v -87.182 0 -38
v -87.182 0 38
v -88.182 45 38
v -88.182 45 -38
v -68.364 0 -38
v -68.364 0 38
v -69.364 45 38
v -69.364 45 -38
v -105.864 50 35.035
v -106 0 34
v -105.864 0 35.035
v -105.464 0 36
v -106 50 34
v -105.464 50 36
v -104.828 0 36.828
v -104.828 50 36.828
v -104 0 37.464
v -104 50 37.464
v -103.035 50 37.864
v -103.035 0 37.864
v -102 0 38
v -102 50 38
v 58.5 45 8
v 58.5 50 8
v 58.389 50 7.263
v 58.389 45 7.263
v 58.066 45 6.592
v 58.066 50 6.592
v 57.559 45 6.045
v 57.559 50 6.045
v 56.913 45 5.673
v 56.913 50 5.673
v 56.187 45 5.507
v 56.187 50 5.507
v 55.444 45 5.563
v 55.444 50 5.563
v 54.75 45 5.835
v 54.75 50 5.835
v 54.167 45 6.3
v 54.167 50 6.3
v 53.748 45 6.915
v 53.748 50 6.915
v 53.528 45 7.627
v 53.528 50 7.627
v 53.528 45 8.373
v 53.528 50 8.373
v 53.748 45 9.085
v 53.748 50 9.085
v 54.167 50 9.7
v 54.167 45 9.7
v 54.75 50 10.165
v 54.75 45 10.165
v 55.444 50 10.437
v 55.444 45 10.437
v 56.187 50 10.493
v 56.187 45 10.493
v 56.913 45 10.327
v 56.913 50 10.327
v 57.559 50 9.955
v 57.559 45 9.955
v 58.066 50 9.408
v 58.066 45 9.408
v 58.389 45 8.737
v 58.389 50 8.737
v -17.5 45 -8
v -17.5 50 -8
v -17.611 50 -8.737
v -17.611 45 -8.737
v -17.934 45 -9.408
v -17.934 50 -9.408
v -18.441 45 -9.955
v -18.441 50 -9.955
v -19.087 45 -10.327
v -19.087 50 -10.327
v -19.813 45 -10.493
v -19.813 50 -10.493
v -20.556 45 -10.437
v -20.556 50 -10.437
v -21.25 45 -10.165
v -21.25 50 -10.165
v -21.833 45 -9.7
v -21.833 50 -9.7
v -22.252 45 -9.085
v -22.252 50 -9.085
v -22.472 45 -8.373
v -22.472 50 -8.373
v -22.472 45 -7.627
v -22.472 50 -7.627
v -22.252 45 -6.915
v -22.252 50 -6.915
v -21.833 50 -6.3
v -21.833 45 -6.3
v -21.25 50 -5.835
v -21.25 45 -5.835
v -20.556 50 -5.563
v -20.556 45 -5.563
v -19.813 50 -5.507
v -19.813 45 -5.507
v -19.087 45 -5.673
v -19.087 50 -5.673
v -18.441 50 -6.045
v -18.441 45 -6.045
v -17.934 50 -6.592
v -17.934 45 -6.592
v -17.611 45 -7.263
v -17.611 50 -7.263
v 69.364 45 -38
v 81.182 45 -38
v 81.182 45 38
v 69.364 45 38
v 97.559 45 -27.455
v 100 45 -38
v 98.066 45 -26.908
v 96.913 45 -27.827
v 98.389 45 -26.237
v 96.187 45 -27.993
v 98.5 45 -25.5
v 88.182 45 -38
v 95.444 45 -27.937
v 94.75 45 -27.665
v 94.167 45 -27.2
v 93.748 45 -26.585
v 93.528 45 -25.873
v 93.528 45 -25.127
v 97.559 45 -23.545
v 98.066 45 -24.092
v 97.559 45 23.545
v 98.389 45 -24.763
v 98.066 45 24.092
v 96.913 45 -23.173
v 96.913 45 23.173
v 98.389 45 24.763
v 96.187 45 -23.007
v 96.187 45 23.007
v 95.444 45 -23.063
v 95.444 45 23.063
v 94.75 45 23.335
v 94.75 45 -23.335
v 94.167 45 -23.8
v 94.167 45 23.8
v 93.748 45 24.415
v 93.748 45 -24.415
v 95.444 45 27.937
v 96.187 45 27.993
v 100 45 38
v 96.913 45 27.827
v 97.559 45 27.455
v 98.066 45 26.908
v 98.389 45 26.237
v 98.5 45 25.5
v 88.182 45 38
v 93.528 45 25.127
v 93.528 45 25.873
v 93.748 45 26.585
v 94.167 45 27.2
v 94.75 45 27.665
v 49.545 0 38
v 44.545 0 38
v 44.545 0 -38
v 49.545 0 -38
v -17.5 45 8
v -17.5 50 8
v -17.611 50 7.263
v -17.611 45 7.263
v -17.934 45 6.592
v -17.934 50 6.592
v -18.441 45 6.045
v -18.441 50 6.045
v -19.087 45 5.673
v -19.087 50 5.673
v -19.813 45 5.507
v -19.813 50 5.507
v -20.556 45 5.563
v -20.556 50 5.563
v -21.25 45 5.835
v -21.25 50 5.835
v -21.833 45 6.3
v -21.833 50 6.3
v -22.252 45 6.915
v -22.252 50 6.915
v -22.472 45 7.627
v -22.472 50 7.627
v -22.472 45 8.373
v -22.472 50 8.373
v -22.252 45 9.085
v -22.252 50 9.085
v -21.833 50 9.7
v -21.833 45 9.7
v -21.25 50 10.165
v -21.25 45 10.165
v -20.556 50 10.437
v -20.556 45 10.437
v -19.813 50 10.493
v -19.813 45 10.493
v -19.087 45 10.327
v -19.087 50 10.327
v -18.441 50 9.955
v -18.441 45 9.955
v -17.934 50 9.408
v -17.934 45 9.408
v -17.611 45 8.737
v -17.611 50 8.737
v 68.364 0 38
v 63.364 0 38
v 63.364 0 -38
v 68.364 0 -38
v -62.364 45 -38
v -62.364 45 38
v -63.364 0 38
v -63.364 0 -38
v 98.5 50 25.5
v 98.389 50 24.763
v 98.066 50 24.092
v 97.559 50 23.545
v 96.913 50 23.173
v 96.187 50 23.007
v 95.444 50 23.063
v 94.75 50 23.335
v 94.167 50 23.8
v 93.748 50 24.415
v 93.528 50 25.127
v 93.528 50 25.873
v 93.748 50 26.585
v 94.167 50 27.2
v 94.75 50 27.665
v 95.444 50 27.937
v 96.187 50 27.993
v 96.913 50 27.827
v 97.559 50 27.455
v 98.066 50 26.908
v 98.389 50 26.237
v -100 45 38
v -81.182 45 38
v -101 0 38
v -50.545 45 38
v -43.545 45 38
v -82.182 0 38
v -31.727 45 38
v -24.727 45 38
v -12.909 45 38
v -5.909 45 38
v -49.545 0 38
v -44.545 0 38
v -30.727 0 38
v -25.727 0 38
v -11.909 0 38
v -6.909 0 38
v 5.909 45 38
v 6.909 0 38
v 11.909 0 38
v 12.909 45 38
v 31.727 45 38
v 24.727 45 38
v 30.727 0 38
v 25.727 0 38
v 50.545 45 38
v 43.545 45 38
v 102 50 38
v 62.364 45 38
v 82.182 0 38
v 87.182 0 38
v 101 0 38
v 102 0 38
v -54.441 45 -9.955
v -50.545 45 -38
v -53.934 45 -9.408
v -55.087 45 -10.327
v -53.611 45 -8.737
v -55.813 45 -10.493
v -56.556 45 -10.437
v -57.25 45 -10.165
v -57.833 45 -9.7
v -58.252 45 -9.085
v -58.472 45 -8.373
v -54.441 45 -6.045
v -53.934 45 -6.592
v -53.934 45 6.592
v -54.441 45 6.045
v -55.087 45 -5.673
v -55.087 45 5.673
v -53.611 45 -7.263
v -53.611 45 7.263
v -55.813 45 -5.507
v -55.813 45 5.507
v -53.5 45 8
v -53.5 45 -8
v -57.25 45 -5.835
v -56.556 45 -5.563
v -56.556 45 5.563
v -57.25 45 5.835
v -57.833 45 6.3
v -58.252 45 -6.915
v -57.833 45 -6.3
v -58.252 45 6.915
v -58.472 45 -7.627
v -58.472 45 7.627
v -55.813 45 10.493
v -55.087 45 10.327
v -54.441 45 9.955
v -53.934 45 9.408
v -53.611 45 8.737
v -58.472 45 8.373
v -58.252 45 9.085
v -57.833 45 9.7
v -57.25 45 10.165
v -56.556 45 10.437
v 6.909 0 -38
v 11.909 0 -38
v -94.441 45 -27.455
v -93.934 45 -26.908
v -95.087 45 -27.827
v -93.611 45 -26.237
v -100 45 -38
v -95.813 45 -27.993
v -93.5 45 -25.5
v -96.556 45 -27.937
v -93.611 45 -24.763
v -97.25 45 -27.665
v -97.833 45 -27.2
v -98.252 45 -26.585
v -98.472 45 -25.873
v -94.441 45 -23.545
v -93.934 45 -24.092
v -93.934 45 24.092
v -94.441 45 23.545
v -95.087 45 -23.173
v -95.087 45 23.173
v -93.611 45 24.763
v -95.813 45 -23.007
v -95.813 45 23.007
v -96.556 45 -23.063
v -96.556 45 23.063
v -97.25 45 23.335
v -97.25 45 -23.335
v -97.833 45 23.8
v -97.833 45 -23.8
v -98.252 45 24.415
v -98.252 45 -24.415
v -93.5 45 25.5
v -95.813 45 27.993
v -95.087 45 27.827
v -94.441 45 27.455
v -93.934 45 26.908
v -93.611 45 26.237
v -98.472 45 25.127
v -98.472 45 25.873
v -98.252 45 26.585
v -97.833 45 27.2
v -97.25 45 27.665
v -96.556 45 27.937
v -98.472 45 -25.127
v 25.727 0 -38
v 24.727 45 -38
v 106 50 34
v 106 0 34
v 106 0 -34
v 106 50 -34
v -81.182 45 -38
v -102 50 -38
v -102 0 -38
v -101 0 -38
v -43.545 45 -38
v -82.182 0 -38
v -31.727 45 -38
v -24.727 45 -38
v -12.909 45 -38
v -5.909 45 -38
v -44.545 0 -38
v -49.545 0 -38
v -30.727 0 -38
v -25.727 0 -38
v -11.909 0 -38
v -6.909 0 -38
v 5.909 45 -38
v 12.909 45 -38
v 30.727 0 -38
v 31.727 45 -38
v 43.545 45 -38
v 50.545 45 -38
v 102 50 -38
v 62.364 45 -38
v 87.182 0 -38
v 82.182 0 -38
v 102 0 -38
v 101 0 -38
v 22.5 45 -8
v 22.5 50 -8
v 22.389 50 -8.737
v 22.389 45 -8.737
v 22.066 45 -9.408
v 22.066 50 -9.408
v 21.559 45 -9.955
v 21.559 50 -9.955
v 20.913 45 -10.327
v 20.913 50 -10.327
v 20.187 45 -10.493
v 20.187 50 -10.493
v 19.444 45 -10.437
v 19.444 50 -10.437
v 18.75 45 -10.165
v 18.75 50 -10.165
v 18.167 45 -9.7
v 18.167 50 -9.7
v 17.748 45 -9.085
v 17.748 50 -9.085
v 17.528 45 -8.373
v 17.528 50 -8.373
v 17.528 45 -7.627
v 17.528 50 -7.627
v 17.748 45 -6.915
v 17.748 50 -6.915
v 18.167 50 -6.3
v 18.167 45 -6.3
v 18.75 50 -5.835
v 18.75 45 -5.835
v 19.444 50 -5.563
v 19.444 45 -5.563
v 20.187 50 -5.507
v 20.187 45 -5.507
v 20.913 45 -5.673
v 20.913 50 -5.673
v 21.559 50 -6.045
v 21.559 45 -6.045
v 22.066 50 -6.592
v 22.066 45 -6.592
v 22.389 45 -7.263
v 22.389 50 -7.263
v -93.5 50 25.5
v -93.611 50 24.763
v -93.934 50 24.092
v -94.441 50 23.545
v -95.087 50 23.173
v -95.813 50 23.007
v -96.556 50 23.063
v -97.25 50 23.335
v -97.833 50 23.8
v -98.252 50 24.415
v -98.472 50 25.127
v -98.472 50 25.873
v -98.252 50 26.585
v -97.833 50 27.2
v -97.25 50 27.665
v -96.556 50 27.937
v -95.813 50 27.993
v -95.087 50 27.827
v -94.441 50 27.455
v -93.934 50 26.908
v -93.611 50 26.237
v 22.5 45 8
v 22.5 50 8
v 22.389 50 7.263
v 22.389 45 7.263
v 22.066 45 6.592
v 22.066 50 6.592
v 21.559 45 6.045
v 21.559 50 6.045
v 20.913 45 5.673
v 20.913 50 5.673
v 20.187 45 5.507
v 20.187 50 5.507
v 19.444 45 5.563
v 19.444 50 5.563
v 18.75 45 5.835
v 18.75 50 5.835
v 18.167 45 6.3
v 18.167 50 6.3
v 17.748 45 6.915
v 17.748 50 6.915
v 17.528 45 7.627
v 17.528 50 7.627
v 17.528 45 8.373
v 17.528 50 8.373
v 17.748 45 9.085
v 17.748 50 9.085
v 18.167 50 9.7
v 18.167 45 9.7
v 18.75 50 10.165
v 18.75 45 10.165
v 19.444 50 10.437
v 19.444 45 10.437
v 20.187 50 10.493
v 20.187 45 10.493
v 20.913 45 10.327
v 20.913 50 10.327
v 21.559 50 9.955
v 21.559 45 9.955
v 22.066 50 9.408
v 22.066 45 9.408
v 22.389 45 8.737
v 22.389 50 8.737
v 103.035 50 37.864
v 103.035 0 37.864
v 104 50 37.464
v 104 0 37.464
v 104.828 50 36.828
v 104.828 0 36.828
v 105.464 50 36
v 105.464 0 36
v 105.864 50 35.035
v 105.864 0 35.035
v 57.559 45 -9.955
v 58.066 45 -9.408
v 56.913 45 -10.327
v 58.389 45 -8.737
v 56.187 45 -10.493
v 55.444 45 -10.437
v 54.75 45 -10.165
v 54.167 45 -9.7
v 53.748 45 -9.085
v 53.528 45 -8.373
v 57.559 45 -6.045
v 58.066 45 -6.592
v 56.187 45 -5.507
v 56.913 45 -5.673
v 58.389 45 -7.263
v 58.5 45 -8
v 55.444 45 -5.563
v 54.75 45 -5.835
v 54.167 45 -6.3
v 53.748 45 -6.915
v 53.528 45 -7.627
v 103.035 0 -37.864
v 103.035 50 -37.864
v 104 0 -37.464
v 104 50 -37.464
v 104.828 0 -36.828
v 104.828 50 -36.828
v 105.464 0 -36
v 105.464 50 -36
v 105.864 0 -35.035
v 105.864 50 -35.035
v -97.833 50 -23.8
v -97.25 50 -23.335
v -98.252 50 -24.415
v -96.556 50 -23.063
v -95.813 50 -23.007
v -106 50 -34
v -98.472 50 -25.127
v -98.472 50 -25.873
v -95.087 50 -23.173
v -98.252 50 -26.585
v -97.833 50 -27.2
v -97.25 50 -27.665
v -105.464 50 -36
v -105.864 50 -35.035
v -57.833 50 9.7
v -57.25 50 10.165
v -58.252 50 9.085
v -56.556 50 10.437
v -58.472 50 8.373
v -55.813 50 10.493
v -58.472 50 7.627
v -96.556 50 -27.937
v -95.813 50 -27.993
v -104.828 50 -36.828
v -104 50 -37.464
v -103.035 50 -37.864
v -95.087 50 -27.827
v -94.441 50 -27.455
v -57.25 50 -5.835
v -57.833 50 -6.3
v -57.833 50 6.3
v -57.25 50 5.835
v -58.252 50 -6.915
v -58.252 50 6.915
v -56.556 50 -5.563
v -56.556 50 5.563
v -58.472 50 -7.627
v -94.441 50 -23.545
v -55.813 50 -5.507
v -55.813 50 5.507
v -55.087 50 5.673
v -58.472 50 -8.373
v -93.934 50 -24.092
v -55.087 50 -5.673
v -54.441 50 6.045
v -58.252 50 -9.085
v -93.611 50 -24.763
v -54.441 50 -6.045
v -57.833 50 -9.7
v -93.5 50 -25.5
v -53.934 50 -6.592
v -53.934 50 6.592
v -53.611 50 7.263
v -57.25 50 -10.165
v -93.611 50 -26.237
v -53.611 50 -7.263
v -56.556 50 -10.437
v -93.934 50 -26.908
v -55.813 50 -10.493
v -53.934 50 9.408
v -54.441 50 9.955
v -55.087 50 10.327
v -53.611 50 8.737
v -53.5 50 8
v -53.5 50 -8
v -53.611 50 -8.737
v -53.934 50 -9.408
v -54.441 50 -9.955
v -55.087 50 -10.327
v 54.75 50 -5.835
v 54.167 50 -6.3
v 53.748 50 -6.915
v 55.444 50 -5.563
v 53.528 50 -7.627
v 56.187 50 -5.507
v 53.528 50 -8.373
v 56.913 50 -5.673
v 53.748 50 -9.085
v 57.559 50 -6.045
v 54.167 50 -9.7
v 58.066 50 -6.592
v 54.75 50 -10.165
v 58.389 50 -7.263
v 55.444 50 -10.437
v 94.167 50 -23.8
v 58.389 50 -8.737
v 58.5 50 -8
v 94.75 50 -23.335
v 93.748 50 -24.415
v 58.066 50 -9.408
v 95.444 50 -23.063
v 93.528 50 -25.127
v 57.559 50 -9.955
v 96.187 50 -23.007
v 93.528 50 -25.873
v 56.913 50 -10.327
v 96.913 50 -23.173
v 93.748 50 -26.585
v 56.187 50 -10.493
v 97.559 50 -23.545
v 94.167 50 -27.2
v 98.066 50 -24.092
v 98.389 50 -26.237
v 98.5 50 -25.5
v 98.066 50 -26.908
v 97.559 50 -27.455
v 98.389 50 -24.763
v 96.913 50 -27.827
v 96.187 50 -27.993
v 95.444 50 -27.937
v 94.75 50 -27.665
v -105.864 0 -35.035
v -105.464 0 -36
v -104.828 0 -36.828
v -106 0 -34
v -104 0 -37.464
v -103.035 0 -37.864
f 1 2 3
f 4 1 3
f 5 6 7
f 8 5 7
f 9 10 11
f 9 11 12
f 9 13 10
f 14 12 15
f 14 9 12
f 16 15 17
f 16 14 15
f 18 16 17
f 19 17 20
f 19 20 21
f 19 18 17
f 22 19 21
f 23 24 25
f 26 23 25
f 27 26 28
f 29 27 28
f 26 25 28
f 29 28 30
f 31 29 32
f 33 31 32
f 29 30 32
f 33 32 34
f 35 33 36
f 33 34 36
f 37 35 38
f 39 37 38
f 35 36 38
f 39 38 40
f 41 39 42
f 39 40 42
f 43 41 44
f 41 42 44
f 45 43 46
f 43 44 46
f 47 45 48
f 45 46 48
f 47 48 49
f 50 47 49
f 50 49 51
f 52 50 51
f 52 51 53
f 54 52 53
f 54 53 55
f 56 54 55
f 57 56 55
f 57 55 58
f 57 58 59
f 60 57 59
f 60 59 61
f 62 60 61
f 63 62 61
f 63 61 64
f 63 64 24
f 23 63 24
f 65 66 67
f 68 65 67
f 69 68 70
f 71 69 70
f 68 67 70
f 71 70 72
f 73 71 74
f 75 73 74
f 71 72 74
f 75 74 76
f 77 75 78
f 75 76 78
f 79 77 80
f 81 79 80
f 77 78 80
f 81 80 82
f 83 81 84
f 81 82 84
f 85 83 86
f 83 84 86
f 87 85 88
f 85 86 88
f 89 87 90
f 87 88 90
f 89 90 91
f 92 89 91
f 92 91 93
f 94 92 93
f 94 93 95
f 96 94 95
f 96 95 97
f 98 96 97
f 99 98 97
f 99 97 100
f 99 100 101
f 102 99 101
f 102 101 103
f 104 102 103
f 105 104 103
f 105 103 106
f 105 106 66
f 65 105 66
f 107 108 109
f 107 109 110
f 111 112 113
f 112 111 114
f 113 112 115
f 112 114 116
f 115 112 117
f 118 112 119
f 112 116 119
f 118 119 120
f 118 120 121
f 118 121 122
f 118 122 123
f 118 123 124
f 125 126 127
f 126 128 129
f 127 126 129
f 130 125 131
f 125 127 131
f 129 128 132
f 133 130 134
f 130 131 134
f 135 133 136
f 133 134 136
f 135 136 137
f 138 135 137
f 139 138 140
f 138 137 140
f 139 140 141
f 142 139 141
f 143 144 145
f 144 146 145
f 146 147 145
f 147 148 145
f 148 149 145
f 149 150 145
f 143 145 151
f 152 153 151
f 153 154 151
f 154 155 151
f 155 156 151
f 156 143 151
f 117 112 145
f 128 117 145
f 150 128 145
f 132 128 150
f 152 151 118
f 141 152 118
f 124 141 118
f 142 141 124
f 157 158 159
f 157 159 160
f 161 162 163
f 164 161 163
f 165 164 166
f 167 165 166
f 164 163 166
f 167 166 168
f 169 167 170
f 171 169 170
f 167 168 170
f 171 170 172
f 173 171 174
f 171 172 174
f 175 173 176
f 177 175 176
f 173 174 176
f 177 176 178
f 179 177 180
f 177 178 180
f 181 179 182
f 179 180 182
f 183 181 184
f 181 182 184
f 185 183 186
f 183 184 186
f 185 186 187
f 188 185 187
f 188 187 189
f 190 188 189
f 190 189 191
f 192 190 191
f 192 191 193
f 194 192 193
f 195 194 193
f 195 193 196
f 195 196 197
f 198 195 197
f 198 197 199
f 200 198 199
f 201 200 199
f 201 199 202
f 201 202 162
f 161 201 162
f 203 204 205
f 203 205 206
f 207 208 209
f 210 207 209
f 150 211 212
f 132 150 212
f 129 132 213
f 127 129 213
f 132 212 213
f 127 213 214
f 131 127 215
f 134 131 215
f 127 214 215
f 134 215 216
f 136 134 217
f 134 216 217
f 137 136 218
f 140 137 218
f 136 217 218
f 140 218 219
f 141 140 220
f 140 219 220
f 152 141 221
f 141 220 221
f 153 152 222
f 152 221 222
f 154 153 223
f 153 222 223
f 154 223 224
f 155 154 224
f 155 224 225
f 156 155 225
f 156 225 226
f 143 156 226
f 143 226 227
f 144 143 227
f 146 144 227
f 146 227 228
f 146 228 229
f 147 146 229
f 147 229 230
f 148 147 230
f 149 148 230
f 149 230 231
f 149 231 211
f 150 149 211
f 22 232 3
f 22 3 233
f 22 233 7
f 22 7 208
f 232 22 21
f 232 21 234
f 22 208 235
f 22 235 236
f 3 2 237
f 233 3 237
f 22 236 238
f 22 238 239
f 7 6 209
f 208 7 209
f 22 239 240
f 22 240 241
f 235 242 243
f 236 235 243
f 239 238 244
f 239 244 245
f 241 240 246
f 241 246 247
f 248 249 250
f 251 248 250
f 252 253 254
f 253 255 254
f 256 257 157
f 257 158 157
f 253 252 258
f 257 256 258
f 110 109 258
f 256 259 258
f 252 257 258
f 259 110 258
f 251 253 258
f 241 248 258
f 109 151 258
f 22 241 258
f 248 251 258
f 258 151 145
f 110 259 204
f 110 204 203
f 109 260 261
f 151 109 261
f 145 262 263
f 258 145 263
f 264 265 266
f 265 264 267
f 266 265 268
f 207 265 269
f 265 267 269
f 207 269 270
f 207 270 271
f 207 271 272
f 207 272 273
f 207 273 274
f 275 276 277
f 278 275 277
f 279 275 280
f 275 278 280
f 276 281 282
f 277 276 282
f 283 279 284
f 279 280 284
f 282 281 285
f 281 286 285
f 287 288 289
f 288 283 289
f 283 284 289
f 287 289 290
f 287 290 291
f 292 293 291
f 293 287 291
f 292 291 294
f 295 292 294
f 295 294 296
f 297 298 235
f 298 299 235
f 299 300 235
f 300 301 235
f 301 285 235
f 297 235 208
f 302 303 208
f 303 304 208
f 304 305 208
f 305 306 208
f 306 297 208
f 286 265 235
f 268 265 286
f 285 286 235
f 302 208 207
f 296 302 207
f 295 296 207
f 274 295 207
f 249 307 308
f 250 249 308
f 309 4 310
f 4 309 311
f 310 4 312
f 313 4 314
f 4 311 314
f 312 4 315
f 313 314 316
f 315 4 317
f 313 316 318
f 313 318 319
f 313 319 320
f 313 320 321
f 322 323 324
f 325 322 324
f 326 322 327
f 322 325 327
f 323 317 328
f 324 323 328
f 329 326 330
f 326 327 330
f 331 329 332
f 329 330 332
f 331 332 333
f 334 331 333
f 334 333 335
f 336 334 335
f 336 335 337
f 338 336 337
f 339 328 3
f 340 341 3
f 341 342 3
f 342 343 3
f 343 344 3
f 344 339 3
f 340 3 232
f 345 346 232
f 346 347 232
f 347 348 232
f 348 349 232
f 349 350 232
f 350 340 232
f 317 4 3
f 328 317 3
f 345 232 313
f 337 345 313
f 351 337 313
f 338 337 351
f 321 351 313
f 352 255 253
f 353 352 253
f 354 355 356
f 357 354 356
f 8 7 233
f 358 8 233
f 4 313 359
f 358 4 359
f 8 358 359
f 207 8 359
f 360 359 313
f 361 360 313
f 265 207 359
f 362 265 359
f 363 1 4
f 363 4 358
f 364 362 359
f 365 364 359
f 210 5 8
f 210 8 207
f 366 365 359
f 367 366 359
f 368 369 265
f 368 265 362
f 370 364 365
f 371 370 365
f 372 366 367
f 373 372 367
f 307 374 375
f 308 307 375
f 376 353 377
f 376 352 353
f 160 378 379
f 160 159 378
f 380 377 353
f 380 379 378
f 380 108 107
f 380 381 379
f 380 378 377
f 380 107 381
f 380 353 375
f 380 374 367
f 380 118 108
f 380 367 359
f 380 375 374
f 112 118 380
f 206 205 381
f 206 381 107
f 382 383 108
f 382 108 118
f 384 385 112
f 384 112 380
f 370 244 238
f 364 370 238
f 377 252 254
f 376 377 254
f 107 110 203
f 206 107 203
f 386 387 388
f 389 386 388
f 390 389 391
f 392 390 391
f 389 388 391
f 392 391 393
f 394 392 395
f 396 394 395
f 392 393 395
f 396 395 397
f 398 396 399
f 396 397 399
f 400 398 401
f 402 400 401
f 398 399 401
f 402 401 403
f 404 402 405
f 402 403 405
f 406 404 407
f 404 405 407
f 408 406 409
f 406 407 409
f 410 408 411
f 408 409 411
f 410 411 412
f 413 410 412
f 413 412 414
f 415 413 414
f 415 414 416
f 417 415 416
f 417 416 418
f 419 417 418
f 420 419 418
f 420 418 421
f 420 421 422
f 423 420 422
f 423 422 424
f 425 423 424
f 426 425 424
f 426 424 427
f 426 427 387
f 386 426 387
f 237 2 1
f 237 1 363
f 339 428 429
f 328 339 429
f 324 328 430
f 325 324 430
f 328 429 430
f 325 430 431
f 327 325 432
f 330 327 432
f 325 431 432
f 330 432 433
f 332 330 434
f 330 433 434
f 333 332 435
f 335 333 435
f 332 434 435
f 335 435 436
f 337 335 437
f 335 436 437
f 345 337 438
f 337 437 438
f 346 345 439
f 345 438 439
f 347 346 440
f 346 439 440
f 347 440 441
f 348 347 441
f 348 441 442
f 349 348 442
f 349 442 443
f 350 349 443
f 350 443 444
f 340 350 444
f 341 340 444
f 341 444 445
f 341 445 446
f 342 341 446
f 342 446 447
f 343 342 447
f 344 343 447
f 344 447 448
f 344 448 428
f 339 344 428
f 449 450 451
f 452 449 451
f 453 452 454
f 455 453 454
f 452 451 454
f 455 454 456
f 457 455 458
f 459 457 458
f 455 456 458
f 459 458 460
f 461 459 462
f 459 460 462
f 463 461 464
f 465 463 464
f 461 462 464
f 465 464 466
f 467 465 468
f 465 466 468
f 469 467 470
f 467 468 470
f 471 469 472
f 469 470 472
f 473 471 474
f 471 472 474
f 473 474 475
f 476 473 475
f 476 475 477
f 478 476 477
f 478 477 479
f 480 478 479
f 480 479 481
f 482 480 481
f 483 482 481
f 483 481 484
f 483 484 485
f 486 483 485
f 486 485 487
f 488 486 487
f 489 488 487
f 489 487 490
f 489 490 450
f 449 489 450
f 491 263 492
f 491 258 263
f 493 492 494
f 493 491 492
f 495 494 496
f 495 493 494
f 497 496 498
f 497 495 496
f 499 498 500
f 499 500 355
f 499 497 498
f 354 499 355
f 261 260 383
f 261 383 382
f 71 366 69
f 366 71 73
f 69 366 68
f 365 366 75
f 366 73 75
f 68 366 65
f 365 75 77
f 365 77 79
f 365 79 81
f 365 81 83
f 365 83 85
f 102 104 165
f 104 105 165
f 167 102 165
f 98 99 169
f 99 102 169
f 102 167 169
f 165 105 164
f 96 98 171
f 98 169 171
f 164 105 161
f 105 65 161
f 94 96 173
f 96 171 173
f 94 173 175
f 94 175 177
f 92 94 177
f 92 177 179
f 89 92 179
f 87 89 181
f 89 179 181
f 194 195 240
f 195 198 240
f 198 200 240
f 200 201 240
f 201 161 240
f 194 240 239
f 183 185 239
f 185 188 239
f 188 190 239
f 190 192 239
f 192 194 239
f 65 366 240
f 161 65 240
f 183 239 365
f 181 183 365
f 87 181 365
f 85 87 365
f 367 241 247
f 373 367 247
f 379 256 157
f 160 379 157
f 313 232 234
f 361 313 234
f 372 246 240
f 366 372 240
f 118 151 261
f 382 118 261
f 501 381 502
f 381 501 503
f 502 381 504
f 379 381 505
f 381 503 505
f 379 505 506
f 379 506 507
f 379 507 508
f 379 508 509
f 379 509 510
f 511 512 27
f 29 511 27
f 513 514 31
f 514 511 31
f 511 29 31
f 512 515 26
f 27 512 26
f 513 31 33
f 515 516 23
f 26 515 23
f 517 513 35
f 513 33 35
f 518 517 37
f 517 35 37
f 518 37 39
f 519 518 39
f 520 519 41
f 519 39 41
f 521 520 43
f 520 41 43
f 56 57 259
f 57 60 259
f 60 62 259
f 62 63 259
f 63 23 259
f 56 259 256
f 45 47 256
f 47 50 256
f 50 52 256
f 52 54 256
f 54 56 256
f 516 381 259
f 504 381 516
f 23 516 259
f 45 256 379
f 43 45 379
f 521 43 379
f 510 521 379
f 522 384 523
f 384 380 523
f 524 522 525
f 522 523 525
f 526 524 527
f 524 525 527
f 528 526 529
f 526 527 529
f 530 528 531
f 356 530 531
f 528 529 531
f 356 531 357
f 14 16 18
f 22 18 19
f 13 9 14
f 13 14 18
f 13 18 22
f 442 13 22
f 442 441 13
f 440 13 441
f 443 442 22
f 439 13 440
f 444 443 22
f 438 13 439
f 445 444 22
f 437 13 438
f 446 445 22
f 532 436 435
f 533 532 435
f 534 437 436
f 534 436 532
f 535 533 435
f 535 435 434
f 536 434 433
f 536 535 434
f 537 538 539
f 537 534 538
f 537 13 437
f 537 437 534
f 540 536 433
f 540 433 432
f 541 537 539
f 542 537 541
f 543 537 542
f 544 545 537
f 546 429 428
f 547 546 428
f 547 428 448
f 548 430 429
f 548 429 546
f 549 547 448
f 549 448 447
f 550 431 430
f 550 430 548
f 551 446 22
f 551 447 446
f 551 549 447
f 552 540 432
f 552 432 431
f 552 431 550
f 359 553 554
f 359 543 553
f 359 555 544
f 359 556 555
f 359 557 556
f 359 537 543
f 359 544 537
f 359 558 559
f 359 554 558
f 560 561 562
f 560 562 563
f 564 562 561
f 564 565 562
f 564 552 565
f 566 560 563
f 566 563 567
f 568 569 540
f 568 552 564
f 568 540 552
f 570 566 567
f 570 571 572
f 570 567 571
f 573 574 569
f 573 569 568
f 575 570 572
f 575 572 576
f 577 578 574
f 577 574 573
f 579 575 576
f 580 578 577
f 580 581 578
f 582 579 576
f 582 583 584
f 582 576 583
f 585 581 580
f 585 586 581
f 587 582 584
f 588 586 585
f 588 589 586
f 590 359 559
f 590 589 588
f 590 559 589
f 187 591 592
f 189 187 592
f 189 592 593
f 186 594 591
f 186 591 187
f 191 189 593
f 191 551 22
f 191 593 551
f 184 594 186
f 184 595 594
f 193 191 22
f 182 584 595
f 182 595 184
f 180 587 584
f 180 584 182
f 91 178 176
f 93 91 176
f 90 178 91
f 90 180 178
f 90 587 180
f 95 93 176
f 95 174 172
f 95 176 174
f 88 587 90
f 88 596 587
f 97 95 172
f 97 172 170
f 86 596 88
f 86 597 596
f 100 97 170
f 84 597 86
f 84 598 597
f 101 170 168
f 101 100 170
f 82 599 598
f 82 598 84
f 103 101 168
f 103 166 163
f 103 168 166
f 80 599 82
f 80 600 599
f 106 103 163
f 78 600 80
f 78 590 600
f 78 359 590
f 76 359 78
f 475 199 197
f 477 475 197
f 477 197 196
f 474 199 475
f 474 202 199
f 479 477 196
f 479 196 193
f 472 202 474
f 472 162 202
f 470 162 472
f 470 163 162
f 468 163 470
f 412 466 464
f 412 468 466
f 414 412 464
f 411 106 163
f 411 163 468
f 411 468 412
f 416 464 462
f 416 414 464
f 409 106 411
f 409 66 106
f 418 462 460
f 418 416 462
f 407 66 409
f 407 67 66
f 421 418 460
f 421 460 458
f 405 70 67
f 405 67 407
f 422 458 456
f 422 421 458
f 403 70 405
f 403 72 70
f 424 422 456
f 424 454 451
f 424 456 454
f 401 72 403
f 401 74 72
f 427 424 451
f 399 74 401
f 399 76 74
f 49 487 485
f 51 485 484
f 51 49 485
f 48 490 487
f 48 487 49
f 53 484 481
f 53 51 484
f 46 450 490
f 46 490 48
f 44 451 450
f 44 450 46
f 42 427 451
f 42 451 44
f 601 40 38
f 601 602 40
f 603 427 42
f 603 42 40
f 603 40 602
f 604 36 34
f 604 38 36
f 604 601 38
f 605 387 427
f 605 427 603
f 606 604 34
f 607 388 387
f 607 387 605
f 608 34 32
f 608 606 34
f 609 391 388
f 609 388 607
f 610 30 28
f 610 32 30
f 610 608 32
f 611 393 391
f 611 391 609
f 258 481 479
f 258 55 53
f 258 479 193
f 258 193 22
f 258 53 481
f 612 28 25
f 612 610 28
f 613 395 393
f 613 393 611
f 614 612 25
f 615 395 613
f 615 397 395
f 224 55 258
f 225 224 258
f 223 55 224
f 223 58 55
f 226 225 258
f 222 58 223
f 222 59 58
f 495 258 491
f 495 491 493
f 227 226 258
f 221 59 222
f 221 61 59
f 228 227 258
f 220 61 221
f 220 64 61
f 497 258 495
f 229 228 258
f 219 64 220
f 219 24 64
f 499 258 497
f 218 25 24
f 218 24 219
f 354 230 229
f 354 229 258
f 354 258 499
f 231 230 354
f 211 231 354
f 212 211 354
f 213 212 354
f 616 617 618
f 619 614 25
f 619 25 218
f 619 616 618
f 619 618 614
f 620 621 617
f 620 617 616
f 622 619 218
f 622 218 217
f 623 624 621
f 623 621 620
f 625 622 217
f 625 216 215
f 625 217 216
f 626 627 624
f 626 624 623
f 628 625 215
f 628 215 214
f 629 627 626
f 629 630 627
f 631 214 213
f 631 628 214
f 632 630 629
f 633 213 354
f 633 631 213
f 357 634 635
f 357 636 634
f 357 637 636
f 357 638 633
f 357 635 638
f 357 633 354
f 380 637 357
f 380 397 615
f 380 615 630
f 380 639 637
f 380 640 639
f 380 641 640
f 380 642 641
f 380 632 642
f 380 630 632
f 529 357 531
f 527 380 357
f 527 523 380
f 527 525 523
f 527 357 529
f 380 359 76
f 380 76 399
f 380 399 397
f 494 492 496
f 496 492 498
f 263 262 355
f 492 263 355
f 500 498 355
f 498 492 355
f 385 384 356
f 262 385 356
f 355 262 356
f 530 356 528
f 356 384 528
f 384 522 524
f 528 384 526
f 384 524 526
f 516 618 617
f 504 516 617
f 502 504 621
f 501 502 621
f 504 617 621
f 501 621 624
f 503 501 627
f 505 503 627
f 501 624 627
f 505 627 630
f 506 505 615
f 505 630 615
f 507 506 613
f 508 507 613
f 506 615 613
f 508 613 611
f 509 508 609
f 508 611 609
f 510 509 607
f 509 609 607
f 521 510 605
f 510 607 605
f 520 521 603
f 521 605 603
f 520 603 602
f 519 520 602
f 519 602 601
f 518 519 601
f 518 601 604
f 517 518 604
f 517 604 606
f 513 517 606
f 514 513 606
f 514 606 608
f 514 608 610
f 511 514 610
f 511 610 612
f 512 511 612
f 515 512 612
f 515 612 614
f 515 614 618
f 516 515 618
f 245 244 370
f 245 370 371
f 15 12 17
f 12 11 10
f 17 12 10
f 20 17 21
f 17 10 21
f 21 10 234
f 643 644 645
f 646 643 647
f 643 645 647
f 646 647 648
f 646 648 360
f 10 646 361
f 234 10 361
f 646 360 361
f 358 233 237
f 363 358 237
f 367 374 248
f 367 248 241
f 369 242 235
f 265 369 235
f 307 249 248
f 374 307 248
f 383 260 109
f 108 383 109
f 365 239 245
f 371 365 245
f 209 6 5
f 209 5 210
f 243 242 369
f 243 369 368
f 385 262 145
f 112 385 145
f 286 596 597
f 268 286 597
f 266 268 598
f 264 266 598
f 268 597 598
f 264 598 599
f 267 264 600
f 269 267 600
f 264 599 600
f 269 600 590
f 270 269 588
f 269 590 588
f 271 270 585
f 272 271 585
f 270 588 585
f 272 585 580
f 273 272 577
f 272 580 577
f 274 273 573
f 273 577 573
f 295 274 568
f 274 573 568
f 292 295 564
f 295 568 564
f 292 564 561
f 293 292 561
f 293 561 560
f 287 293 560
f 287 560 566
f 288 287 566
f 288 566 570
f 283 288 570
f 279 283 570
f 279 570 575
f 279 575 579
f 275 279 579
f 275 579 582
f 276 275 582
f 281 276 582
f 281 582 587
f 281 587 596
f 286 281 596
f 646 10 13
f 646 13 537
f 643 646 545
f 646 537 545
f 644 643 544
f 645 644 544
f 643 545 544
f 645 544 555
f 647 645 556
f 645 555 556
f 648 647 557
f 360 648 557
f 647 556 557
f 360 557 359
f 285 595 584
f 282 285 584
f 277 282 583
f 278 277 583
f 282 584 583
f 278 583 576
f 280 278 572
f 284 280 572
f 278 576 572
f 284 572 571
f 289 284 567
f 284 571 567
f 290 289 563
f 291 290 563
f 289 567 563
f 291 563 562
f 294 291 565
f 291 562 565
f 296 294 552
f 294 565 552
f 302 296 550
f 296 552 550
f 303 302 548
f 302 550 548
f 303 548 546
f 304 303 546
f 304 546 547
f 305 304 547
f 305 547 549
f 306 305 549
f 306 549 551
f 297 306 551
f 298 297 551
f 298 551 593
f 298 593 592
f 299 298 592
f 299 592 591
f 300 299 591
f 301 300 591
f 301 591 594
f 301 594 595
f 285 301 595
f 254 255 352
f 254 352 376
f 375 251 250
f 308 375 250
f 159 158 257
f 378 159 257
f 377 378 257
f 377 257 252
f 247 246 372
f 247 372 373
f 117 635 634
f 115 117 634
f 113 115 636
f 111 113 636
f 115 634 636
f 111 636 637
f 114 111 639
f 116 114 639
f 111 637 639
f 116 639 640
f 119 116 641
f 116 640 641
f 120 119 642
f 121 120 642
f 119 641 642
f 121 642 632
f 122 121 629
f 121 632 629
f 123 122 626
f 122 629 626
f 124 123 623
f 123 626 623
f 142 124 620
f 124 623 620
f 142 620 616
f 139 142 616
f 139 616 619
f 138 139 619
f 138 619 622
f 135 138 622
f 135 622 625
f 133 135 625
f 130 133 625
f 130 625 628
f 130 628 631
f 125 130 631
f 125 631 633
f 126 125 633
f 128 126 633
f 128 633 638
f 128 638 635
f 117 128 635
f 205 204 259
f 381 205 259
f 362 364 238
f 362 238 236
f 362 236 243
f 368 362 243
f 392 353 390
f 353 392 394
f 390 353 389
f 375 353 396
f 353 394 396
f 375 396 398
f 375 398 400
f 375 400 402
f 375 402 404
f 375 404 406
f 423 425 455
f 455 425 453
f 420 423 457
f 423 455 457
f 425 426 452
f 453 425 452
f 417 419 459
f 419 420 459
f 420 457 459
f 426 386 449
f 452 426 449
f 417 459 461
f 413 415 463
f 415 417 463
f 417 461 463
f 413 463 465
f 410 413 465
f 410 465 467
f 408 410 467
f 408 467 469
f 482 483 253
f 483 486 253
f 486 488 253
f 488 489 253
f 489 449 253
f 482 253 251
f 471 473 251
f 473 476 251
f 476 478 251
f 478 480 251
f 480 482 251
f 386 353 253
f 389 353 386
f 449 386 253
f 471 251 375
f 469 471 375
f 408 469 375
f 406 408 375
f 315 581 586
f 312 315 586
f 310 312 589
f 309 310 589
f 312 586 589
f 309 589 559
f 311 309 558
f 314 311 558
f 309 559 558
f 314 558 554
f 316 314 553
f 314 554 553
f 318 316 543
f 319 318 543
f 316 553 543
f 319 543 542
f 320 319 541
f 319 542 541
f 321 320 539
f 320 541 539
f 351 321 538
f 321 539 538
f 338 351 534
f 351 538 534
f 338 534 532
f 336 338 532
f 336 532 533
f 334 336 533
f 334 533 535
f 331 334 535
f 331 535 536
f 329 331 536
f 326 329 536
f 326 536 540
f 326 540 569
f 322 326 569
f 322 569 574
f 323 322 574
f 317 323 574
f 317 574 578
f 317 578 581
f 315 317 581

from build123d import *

# Parameters (mm, degrees)
SKETCH1_W           = 212
SKETCH1_H           = 76
BOSS_EXTRUDE1_DEPTH = 50
CUT_EXTRUDE1_DEPTH  = 77
SKETCH4_R           = 2.5
CUT_EXTRUDE2_DEPTH  = 77
FILLET1_R           = 4


with BuildPart() as part:
    # Sketch1 → Boss-Extrude1 (new body)
    with BuildSketch(Plane(origin=(0, 0, 0), x_dir=(1, 0, 0), z_dir=(0, 1, 0))):
        Rectangle(SKETCH1_W, SKETCH1_H)
    extrude(amount=BOSS_EXTRUDE1_DEPTH)

    # Sketch2 → Cut-Extrude1 (cut)
    with BuildSketch(Plane.XY.offset(38)):
        Polygon((101, 0), (100, 45), (88.181819, 45), (87.181819, 0), align=None)
        Polygon((68.363638, 0), (82.181819, 0), (81.181819, 45), (69.363638, 45), align=None)
        Polygon((49.545457, 0), (63.363638, 0), (62.363638, 45), (50.545457, 45), align=None)
        Polygon((30.727276, 0), (44.545457, 0), (43.545457, 45), (31.727276, 45), align=None)
        Polygon((11.909095, 0), (25.727276, 0), (24.727276, 45), (12.909095, 45), align=None)
        Polygon((-6.909086, 0), (6.909095, 0), (5.909095, 45), (-5.909086, 45), align=None)
        Polygon((-25.727267, 0), (-11.909086, 0), (-12.909086, 45), (-24.727267, 45), align=None)
        Polygon((-44.545448, 0), (-30.727267, 0), (-31.727267, 45), (-43.545448, 45), align=None)
        Polygon((-63.363629, 0), (-49.545448, 0), (-50.545448, 45), (-62.363629, 45), align=None)
        Polygon((-82.18181, 0), (-68.363629, 0), (-69.363629, 45), (-81.18181, 45), align=None)
        Polygon((-100.999991, 0), (-87.18181, 0), (-88.18181, 45), (-99.999991, 45), align=None)
    extrude(amount=-CUT_EXTRUDE1_DEPTH, mode=Mode.SUBTRACT)

    # Sketch4 → Cut-Extrude2 (cut)
    with BuildSketch(Plane(origin=(0, 50, 0), x_dir=(1, 0, 0), z_dir=(0, 1, 0))):
        with Locations((-96, 25.5)):
            Circle(SKETCH4_R)
        with Locations((-96, -25.5)):
            Circle(SKETCH4_R)
        with Locations((96, 25.5)):
            Circle(SKETCH4_R)
        with Locations((96, -25.5)):
            Circle(SKETCH4_R)
        with Locations((-56, 8)):
            Circle(SKETCH4_R)
        with Locations((-20, 8)):
            Circle(SKETCH4_R)
        with Locations((-20, -8)):
            Circle(SKETCH4_R)
        with Locations((-56, -8)):
            Circle(SKETCH4_R)
        with Locations((56, -8)):
            Circle(SKETCH4_R)
        with Locations((20, -8)):
            Circle(SKETCH4_R)
        with Locations((20, 8)):
            Circle(SKETCH4_R)
        with Locations((56, 8)):
            Circle(SKETCH4_R)
    extrude(amount=-CUT_EXTRUDE2_DEPTH, mode=Mode.SUBTRACT)

    # Fillet1
    fillet1_edges = [part.edges().sort_by_distance(p)[0] for p in [
        (106, 25, 38),
        (-106, 25, 38),
        (-106, 25, -38),
        (106, 25, -38),
    ]]
    fillet(fillet1_edges, radius=FILLET1_R)


solid = part.part
